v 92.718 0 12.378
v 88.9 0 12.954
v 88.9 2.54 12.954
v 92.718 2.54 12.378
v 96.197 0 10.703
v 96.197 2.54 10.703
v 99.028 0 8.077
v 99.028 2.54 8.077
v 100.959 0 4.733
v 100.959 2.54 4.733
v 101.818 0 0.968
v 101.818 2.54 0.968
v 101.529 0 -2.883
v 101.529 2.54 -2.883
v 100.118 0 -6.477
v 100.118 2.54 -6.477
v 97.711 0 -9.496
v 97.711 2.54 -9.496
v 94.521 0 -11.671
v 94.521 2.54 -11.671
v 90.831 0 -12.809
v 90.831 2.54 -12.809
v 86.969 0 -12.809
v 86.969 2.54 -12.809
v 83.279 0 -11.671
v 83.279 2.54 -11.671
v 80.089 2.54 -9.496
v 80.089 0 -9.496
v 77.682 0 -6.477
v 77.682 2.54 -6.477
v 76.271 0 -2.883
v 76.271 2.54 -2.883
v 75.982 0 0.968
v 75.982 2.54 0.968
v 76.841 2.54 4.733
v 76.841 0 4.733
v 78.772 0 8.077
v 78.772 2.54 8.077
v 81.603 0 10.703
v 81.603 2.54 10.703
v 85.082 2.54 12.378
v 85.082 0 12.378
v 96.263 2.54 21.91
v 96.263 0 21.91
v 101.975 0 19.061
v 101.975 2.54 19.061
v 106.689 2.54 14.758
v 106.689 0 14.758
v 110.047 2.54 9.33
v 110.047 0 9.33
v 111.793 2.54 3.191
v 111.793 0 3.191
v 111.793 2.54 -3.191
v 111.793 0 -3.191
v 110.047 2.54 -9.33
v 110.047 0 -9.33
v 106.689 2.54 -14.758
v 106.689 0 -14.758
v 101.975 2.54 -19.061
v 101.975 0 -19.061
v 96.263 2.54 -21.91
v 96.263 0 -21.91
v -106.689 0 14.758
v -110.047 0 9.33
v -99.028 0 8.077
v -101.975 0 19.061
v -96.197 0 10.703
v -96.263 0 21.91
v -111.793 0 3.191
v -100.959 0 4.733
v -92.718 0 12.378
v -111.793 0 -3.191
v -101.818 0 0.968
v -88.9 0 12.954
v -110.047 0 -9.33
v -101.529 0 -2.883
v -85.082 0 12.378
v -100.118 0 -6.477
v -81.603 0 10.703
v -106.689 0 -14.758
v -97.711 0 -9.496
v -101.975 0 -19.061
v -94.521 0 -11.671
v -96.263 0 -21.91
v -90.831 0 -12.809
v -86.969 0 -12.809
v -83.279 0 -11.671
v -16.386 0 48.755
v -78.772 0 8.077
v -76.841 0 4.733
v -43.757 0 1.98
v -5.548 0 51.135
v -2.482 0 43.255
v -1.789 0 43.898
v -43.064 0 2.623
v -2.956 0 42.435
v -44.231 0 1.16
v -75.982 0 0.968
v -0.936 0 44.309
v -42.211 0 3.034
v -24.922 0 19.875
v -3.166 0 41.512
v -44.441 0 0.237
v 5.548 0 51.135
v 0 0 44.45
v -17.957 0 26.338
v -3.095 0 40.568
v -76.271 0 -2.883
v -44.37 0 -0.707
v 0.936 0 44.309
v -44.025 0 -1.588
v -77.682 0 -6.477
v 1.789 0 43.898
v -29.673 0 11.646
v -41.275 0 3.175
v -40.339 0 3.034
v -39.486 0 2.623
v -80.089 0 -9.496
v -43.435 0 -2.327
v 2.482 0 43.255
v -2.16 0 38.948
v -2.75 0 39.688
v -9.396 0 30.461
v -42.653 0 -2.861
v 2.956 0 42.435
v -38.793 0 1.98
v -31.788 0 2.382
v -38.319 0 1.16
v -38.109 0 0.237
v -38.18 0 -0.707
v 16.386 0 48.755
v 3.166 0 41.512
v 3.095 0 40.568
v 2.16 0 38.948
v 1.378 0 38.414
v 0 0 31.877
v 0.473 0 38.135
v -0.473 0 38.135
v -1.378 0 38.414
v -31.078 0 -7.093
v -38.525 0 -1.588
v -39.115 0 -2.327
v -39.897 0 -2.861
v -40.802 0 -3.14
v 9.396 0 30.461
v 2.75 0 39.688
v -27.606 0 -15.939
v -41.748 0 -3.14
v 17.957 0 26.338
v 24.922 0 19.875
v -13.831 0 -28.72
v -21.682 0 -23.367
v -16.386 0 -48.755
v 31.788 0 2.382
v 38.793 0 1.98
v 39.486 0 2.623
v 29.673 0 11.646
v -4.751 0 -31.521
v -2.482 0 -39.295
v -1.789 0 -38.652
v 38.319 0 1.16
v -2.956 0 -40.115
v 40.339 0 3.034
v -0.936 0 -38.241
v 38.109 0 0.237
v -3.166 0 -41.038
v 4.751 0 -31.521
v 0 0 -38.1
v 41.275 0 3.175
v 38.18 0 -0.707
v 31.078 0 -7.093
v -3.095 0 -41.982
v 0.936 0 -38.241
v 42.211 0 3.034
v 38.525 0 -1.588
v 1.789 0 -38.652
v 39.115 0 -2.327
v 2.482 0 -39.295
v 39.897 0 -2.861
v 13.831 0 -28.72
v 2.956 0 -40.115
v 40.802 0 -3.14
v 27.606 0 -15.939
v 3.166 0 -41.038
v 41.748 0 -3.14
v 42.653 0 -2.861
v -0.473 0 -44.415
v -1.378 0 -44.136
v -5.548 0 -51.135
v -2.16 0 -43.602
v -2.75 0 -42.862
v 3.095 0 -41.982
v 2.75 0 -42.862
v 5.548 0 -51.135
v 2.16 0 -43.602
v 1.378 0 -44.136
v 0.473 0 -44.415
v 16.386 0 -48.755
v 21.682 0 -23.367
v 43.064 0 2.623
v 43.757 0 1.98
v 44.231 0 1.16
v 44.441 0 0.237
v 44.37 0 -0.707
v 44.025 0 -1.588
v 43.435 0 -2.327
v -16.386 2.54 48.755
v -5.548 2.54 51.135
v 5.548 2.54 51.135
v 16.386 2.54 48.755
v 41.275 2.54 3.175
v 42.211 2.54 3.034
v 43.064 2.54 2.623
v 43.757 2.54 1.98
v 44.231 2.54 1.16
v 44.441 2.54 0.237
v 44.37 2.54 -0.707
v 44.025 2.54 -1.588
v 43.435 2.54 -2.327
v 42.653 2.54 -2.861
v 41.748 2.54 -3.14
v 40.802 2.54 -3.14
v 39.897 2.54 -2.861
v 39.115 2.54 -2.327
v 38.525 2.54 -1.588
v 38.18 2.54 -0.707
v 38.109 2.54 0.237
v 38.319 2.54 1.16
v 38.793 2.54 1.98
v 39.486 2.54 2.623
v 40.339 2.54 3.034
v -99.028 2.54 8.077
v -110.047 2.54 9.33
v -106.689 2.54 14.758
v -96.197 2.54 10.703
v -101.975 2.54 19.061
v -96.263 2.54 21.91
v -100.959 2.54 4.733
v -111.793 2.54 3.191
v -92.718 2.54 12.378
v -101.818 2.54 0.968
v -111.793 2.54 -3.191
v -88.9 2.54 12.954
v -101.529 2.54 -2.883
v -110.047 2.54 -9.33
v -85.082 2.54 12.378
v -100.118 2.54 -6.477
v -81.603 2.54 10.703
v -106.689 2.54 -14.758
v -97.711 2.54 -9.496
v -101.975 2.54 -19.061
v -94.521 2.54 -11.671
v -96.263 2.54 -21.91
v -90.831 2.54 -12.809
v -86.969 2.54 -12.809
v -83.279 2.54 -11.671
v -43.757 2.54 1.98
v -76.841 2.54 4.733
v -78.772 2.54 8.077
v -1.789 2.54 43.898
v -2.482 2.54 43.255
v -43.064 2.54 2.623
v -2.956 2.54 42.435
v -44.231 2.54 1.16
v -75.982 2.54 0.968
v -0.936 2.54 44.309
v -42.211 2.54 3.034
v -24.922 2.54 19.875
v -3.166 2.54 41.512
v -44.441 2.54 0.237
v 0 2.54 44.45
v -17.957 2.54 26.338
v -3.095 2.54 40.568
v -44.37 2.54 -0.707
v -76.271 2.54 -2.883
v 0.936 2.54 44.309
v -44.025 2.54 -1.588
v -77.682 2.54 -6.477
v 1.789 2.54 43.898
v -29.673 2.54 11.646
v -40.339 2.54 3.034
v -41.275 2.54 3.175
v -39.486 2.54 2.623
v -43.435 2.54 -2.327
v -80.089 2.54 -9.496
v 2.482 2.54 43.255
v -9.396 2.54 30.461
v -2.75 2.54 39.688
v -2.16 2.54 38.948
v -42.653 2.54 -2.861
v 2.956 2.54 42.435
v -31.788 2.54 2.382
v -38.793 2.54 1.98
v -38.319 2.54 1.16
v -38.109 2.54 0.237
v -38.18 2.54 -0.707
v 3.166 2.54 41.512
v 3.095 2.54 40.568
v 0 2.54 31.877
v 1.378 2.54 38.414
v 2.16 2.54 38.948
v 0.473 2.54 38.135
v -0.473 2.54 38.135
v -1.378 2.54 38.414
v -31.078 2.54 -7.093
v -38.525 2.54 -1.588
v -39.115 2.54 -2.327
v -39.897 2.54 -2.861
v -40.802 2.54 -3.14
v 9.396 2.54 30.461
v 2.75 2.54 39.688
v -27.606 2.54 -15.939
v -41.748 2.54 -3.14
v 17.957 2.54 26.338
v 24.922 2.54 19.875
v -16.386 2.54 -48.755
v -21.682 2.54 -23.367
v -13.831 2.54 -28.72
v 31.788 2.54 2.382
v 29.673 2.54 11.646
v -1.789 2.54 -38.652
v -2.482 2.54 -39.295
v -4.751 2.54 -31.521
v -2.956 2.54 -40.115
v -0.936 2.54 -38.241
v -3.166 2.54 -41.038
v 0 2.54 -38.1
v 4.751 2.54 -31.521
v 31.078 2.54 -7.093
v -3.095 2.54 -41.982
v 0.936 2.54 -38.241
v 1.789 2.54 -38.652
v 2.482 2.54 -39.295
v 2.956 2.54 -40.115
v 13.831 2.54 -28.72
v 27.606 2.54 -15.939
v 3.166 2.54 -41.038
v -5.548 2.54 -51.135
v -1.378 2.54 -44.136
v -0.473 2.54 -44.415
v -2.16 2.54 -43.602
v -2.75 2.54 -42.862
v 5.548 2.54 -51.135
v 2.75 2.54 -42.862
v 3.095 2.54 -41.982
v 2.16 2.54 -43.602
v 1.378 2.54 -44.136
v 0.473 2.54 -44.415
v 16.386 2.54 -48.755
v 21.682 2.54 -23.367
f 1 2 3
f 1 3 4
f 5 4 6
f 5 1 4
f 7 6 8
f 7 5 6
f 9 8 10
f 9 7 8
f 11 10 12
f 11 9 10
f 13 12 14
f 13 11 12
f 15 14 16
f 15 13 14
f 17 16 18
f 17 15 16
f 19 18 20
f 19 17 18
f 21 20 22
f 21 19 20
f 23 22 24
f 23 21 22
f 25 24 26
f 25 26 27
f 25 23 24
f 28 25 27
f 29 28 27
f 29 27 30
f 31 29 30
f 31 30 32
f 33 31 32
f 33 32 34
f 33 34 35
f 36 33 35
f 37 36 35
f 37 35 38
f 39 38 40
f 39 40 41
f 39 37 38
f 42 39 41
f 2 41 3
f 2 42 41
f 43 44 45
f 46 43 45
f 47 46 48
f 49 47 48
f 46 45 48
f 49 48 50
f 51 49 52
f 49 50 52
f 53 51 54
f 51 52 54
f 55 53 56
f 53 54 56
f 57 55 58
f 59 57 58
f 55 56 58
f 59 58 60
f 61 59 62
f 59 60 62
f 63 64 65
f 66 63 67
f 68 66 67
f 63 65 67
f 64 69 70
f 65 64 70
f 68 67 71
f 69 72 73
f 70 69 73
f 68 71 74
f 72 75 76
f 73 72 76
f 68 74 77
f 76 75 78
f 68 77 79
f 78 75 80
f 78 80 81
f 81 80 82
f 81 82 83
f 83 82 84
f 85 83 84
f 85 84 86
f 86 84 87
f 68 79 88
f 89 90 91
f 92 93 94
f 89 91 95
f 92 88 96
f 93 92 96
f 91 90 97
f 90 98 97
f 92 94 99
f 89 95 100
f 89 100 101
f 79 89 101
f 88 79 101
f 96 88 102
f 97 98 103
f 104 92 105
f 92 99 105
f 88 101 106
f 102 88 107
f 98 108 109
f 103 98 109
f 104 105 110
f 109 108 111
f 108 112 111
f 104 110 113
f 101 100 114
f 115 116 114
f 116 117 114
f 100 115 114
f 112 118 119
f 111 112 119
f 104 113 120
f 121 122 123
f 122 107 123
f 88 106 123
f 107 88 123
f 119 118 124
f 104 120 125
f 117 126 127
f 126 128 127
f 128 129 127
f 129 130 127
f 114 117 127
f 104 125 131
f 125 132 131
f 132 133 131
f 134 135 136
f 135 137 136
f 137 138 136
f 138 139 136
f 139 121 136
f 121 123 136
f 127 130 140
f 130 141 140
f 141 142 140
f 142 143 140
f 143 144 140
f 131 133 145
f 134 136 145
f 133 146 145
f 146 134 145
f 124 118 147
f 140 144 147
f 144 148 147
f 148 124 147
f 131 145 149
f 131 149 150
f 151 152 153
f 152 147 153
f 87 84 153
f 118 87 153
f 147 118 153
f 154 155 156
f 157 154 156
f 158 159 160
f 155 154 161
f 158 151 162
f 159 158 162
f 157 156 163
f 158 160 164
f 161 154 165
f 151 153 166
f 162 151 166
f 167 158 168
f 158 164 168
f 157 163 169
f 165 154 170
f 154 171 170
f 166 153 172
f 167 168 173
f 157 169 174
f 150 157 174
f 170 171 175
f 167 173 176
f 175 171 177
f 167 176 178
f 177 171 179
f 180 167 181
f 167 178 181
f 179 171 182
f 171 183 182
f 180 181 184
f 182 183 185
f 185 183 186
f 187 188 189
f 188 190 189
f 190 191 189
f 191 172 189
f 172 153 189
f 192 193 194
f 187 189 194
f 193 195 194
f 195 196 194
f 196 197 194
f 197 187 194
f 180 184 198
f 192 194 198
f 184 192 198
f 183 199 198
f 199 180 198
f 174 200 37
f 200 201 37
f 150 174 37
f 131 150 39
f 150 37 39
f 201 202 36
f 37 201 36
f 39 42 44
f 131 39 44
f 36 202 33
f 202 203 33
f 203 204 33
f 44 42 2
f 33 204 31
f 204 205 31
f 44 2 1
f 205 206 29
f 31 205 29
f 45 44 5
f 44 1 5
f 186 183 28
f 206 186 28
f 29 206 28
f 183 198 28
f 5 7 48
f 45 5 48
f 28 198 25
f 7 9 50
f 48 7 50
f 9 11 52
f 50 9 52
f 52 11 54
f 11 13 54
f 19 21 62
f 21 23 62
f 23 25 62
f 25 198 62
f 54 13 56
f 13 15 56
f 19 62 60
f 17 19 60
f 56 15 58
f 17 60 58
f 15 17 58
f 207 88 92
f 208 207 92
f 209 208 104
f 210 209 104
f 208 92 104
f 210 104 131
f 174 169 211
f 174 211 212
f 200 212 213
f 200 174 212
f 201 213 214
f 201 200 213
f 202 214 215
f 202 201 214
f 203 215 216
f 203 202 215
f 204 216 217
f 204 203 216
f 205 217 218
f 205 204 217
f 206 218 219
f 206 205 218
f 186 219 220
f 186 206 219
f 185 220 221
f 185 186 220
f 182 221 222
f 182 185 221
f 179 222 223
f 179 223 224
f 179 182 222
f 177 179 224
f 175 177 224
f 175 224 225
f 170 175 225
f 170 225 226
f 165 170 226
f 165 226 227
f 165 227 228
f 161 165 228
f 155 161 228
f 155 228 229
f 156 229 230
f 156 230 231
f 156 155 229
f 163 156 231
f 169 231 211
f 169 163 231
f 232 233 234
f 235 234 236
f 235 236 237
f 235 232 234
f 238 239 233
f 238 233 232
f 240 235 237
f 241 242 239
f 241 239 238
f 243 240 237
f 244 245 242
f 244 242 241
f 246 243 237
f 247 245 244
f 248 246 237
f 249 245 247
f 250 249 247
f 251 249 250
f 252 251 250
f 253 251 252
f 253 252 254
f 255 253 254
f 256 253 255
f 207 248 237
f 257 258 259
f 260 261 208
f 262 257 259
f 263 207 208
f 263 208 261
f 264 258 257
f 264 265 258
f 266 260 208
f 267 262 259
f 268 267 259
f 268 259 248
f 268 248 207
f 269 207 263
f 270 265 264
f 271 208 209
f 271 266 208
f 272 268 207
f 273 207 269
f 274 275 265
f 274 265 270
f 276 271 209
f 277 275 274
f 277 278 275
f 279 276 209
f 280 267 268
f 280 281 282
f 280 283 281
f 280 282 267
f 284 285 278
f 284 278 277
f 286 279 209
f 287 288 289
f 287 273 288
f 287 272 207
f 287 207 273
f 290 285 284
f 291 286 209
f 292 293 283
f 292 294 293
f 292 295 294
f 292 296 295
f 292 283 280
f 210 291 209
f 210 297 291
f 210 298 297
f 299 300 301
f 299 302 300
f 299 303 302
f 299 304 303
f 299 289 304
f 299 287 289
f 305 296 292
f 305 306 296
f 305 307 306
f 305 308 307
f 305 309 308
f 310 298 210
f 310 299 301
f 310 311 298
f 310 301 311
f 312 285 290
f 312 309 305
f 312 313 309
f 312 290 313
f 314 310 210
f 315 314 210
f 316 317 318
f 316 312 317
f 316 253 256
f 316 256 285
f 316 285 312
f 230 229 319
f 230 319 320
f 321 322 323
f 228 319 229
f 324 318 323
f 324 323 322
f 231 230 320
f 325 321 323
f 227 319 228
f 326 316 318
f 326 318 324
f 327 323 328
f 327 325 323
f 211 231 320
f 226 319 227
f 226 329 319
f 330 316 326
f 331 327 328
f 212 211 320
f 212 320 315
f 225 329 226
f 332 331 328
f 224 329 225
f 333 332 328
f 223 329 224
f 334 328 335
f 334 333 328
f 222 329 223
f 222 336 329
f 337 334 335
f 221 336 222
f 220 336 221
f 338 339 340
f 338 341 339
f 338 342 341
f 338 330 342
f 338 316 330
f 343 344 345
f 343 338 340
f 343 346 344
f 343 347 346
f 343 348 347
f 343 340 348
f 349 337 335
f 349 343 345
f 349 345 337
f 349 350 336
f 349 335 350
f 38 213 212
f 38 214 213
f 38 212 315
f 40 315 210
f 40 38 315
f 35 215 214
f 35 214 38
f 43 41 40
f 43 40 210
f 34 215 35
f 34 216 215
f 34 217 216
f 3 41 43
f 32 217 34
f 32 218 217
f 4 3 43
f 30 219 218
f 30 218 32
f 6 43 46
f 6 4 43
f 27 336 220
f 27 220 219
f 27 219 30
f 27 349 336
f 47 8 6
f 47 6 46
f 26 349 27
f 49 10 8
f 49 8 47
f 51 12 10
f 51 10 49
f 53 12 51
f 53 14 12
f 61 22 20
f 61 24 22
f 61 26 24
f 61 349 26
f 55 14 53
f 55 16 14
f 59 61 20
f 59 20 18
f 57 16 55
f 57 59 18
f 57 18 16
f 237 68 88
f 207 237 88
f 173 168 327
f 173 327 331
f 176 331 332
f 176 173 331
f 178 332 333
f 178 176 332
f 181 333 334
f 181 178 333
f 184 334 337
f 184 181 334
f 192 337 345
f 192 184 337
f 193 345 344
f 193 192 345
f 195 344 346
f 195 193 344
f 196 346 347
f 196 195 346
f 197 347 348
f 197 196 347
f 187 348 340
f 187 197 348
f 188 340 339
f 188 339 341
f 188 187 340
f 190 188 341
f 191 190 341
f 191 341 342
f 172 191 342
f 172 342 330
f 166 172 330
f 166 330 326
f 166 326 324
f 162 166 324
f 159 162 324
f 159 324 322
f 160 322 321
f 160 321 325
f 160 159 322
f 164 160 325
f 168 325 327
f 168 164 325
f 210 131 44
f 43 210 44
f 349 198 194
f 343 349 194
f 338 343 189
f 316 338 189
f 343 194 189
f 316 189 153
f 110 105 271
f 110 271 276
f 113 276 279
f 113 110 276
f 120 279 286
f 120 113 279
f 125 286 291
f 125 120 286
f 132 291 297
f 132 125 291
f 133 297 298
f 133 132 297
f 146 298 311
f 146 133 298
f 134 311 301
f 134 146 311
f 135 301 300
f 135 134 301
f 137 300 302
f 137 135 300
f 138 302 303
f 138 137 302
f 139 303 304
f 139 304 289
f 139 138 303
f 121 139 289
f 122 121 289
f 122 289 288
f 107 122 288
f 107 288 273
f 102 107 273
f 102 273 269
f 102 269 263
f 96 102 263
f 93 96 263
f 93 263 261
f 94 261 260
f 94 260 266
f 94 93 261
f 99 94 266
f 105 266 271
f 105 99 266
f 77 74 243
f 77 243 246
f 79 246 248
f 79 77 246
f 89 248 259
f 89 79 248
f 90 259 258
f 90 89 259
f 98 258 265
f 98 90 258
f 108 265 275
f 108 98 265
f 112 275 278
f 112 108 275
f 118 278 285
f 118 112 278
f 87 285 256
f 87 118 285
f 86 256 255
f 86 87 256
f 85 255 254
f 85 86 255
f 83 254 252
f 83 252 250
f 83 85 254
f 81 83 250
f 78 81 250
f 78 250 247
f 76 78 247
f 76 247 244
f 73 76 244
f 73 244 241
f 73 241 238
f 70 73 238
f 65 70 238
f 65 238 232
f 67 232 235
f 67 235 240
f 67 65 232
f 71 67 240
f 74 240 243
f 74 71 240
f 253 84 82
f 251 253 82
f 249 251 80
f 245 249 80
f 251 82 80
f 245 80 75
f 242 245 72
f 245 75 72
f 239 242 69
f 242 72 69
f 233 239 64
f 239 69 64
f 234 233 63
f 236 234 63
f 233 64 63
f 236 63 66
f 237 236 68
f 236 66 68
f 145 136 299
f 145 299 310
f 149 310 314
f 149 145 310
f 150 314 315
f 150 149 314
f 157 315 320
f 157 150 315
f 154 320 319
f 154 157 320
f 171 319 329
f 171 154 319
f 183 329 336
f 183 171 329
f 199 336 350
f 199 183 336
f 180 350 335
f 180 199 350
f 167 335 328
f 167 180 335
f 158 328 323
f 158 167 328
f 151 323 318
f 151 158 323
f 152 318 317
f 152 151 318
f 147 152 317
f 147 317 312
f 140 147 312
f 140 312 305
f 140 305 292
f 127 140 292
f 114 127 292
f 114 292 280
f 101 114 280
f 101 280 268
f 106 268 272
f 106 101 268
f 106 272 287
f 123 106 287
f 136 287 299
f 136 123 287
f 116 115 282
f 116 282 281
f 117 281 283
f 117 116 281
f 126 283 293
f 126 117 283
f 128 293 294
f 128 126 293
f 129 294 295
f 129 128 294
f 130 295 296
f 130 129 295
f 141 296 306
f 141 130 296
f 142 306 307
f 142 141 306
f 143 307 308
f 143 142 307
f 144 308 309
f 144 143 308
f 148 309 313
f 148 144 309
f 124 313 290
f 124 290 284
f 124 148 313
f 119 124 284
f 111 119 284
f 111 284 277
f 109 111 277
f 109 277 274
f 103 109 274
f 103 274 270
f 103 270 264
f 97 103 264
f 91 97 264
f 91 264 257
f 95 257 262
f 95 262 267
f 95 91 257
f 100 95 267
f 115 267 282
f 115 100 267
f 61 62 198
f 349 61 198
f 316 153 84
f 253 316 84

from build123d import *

# Parameters (mm, degrees)
SKETCH1_R           = 3.175
SKETCH1_R_2         = 12.954
SKETCH1_R_3         = 31.877
BOSS_EXTRUDE1_DEPTH = 2.54


with BuildPart() as part:
    # Sketch1 → Boss-Extrude1 (new body)
    with BuildSketch(Plane(origin=(0, 0, 0), x_dir=(1, 0, 0), z_dir=(0, 1, 0))):
        with BuildLine():
            Line((96.26346, 21.909734203), (16.385721429, 48.755177759))
            ThreePointArc((16.385721429, 48.755177759), (0, 51.435), (-16.385721429, 48.755177759))
            Line((-16.385721429, 48.755177759), (-96.26346, 21.909734203))
            ThreePointArc((-96.26346, 21.909734203), (-112.014, 0), (-96.26346, -21.909734203))
            Line((-96.26346, -21.909734203), (-16.385721429, -48.755177759))
            ThreePointArc((-16.385721429, -48.755177759), (0, -51.435), (16.385721429, -48.755177759))
            Line((16.385721429, -48.755177759), (96.26346, -21.909734203))
            ThreePointArc((96.26346, -21.909734203), (112.014, 0), (96.26346, 21.909734203))
        make_face()
        with Locations(Location((-41.275, 0, 0), (0, 0, 270))):
            Circle(SKETCH1_R, mode=Mode.SUBTRACT)
        with Locations(Location((0, -41.275, 0), (0, 0, 270))):
            Circle(SKETCH1_R, mode=Mode.SUBTRACT)
        with Locations(Location((-88.9, 0, 0), (0, 0, 270))):
            Circle(SKETCH1_R_2, mode=Mode.SUBTRACT)
        with Locations(Location((0, 0, 0), (0, 0, 270))):
            Circle(SKETCH1_R_3, mode=Mode.SUBTRACT)
        with Locations(Location((41.275, 0, 0), (0, 0, 270))):
            Circle(SKETCH1_R, mode=Mode.SUBTRACT)
        with Locations(Location((88.9, 0, 0), (0, 0, 270))):
            Circle(SKETCH1_R_2, mode=Mode.SUBTRACT)
        with Locations(Location((0, 41.275, 0), (0, 0, 270))):
            Circle(SKETCH1_R, mode=Mode.SUBTRACT)
    extrude(amount=BOSS_EXTRUDE1_DEPTH)


solid = part.part
